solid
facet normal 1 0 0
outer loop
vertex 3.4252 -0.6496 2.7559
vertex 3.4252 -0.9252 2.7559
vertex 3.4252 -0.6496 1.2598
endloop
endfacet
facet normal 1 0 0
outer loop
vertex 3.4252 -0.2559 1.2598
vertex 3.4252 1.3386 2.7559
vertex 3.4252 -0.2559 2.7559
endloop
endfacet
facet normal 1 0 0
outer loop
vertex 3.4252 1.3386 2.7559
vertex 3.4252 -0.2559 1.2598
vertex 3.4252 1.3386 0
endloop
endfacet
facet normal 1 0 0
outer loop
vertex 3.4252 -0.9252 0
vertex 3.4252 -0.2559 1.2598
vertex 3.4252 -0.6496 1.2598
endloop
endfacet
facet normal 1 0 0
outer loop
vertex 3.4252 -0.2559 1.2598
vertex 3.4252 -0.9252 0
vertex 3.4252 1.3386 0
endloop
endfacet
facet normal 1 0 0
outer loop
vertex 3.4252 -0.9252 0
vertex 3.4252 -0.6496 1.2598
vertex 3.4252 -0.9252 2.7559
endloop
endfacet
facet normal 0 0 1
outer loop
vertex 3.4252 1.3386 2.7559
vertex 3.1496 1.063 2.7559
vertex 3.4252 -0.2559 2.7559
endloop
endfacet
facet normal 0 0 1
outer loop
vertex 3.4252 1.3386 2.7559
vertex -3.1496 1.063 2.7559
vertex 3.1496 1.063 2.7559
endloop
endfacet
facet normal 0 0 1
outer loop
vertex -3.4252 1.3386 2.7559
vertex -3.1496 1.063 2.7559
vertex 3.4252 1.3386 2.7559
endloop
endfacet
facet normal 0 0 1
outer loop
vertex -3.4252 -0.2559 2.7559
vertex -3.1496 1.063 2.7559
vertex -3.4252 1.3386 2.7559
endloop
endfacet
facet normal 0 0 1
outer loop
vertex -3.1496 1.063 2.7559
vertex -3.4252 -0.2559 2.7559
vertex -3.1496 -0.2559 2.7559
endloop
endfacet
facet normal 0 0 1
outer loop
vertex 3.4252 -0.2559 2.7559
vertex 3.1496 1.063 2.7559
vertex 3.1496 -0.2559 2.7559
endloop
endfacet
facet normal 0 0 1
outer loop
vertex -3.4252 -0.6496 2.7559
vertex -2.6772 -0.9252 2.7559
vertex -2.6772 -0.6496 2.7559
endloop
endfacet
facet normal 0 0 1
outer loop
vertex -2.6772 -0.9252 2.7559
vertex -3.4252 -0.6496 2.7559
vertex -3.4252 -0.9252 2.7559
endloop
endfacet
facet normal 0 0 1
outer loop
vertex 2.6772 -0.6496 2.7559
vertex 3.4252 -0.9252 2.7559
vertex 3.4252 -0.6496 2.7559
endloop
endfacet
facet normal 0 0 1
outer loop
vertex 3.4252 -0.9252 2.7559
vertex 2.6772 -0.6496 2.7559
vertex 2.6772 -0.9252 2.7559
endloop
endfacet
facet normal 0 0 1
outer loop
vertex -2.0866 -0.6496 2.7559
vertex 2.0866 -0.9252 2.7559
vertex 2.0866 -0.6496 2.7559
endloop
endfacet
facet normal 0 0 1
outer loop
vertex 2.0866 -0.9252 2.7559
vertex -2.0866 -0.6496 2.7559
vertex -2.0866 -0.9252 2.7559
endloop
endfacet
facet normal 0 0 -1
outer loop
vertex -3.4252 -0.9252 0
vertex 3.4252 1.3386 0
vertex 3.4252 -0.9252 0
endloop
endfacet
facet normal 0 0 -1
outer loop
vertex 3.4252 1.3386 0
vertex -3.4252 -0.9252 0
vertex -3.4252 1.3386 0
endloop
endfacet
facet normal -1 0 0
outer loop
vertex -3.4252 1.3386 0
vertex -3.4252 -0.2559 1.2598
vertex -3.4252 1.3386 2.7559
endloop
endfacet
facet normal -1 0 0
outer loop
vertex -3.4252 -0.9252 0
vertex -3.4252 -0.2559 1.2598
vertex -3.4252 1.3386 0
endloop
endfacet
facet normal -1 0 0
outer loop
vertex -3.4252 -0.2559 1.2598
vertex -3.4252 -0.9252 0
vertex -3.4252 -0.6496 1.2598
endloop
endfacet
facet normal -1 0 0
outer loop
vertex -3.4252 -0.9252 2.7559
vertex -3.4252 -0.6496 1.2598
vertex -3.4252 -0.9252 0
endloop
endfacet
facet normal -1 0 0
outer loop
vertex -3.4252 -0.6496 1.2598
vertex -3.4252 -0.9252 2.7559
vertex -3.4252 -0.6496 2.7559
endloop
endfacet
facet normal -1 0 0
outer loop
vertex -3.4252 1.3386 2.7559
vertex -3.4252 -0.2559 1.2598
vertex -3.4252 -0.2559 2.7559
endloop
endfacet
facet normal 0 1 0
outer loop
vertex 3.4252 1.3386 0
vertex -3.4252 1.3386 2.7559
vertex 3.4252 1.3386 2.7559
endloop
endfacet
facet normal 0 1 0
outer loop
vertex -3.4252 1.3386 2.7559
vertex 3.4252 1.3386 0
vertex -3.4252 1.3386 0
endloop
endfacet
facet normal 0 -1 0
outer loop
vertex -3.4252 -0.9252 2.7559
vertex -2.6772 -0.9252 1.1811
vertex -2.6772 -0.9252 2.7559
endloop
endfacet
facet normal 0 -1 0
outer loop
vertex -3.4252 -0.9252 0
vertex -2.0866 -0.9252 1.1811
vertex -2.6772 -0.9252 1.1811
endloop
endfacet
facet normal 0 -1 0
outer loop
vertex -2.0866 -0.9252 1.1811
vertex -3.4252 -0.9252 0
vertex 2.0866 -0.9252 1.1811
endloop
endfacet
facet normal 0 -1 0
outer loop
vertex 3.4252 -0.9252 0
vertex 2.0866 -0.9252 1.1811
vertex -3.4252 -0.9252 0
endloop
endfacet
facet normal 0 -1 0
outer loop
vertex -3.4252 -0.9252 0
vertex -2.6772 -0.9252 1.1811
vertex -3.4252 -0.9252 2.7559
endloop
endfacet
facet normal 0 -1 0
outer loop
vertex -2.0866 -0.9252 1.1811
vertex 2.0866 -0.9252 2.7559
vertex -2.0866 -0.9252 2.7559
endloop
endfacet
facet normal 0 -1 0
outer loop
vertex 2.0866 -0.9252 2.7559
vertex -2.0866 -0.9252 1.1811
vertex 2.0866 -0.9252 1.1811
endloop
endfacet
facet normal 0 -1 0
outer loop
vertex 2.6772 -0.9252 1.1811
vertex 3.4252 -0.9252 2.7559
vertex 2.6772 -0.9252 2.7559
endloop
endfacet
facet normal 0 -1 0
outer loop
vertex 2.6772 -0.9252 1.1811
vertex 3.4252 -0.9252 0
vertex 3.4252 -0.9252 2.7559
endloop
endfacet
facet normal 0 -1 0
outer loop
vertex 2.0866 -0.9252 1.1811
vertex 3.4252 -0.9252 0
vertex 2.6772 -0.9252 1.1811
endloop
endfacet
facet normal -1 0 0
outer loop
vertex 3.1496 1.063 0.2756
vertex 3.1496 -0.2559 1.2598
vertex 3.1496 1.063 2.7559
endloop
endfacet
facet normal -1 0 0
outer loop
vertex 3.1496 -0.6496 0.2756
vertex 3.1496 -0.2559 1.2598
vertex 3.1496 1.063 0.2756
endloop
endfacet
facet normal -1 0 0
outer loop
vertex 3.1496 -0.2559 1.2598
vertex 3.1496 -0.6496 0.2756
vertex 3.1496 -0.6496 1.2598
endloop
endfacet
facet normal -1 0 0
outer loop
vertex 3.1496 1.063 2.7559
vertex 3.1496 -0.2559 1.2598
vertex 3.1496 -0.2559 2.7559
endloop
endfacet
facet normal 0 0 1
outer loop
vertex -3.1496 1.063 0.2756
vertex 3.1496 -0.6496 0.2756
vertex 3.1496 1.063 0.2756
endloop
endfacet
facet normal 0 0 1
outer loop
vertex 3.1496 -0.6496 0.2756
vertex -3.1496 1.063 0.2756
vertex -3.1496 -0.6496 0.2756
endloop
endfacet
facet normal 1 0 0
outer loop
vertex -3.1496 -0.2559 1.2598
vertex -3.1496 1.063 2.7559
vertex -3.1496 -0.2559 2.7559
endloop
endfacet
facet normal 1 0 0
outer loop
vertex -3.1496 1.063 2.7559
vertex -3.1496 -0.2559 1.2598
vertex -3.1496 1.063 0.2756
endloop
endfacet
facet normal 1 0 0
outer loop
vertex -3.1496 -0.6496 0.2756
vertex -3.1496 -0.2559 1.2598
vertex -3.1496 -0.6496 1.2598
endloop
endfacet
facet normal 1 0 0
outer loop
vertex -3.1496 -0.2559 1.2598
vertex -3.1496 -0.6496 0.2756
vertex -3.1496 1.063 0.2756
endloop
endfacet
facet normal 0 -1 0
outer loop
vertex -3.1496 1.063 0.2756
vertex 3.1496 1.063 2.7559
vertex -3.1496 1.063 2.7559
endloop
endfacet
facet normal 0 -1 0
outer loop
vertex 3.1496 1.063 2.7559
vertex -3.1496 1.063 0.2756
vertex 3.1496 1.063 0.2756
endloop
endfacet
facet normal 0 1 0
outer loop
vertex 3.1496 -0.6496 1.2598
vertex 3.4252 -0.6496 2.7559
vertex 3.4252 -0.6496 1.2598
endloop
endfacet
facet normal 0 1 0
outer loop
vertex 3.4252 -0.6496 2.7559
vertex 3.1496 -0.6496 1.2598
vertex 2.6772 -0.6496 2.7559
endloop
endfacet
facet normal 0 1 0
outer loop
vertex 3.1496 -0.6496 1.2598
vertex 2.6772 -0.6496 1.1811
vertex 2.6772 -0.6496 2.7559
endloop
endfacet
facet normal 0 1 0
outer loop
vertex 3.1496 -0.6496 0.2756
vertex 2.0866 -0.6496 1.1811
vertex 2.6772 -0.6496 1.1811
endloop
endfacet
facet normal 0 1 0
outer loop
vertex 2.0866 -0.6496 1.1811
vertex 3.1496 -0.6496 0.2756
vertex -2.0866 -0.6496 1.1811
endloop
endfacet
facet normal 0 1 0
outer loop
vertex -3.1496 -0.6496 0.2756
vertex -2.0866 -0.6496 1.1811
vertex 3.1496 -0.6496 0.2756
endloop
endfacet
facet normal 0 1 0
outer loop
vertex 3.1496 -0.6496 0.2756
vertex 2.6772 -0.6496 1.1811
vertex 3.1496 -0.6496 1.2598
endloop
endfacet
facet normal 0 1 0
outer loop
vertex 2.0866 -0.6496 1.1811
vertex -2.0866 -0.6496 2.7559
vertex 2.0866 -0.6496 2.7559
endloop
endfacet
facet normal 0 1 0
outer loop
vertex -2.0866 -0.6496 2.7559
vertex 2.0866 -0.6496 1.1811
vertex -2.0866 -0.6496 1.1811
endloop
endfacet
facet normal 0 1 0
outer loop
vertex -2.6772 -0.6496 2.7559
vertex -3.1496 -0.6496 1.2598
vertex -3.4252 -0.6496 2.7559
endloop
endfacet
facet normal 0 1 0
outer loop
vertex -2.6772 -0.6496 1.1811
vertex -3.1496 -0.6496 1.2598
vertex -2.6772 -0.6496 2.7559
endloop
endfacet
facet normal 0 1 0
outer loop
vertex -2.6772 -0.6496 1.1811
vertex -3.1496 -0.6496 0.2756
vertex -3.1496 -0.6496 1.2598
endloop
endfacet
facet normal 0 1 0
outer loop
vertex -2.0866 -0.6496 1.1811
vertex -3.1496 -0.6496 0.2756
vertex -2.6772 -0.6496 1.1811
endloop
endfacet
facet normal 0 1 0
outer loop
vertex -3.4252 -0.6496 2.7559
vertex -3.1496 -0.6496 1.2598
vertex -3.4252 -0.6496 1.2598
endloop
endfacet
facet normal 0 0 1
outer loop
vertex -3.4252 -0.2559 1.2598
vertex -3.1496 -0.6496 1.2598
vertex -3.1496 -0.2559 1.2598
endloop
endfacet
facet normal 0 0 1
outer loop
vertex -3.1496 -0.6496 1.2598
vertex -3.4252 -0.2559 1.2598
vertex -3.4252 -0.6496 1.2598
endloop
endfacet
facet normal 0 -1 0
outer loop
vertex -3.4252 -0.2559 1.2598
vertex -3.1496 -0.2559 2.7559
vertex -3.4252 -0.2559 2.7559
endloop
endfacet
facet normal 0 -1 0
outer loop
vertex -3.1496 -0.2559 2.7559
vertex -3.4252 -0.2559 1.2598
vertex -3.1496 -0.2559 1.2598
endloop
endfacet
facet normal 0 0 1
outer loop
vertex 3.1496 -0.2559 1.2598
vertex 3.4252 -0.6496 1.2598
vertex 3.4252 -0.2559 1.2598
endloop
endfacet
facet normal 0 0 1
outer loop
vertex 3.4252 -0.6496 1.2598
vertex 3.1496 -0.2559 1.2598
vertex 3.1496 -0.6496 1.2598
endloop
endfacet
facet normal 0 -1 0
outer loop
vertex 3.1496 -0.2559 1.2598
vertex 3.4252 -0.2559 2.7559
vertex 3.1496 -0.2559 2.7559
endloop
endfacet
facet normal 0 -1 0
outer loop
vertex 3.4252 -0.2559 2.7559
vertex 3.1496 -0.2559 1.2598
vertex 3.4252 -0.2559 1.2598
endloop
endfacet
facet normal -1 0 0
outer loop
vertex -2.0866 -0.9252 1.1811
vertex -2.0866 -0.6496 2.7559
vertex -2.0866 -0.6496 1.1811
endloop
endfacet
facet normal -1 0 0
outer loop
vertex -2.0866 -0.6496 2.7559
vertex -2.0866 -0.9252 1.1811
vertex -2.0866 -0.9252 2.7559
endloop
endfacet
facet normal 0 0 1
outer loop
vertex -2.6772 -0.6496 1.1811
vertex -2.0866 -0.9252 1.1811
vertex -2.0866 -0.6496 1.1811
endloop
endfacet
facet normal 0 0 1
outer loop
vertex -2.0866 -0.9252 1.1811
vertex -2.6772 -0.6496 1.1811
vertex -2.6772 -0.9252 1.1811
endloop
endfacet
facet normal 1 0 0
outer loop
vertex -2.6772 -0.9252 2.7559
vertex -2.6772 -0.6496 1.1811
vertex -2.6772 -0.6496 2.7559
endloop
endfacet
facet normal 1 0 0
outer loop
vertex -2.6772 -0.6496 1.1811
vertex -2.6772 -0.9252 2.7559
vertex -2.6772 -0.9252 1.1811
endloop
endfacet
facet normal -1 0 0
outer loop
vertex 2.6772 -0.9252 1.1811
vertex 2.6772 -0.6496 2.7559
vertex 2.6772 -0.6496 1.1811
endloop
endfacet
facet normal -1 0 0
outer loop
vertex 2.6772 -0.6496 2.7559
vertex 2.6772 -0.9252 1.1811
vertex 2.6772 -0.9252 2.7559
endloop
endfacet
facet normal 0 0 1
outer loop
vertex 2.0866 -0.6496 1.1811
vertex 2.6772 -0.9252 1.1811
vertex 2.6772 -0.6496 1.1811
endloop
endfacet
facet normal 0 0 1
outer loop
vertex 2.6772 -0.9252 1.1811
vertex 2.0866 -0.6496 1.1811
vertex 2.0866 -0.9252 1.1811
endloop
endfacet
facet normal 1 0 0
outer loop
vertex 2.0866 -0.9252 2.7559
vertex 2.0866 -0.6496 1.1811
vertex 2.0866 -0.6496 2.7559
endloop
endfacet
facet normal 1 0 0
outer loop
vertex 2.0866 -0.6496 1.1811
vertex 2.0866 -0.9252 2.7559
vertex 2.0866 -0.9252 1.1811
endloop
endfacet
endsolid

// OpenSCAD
// file: defines.scad
// example012.stl is Mblock.stl, (c) 2009 Will Langford
// licensed under the Creative Commons - GNU GPL license.
// http://www.thingiverse.com/thing:753

//import("sim800c.stl", convexity=3);

// PCB

A = 2.5;
B = 17.4;

scale = 1/2.54;
// main file
include <defines.scad>

W = 5.75;
W_O = 2.35;
H = 7.0;

th = 0.7; // Walls

scale(scale) color("White") {

difference() {
// Base

  translate([-B/2, -W_O, 0])
    cube(size = [B, W, H], center = false);

  translate([-B/2 + th, -W_O + th, th])
    cube(size = [B - th*2, W - th*2, H], center = false);

    translate([-B/2-1 , -W_O + th, H-3.8])
      cube(size = [2, 1, 3.9], center = false);

    translate([ B/2-1 , -W_O + th, H-3.8])
      cube(size = [2, 1, 3.9], center = false);

    translate([ -5.3-1.5, -W_O - 1, H-4.0])
      cube(size = [1.5, 2, 4.1], center = false);

    translate([ 5.3, -W_O - 1, H-4.0])
      cube(size = [1.5, 2, 4.1], center = false);
}


}
